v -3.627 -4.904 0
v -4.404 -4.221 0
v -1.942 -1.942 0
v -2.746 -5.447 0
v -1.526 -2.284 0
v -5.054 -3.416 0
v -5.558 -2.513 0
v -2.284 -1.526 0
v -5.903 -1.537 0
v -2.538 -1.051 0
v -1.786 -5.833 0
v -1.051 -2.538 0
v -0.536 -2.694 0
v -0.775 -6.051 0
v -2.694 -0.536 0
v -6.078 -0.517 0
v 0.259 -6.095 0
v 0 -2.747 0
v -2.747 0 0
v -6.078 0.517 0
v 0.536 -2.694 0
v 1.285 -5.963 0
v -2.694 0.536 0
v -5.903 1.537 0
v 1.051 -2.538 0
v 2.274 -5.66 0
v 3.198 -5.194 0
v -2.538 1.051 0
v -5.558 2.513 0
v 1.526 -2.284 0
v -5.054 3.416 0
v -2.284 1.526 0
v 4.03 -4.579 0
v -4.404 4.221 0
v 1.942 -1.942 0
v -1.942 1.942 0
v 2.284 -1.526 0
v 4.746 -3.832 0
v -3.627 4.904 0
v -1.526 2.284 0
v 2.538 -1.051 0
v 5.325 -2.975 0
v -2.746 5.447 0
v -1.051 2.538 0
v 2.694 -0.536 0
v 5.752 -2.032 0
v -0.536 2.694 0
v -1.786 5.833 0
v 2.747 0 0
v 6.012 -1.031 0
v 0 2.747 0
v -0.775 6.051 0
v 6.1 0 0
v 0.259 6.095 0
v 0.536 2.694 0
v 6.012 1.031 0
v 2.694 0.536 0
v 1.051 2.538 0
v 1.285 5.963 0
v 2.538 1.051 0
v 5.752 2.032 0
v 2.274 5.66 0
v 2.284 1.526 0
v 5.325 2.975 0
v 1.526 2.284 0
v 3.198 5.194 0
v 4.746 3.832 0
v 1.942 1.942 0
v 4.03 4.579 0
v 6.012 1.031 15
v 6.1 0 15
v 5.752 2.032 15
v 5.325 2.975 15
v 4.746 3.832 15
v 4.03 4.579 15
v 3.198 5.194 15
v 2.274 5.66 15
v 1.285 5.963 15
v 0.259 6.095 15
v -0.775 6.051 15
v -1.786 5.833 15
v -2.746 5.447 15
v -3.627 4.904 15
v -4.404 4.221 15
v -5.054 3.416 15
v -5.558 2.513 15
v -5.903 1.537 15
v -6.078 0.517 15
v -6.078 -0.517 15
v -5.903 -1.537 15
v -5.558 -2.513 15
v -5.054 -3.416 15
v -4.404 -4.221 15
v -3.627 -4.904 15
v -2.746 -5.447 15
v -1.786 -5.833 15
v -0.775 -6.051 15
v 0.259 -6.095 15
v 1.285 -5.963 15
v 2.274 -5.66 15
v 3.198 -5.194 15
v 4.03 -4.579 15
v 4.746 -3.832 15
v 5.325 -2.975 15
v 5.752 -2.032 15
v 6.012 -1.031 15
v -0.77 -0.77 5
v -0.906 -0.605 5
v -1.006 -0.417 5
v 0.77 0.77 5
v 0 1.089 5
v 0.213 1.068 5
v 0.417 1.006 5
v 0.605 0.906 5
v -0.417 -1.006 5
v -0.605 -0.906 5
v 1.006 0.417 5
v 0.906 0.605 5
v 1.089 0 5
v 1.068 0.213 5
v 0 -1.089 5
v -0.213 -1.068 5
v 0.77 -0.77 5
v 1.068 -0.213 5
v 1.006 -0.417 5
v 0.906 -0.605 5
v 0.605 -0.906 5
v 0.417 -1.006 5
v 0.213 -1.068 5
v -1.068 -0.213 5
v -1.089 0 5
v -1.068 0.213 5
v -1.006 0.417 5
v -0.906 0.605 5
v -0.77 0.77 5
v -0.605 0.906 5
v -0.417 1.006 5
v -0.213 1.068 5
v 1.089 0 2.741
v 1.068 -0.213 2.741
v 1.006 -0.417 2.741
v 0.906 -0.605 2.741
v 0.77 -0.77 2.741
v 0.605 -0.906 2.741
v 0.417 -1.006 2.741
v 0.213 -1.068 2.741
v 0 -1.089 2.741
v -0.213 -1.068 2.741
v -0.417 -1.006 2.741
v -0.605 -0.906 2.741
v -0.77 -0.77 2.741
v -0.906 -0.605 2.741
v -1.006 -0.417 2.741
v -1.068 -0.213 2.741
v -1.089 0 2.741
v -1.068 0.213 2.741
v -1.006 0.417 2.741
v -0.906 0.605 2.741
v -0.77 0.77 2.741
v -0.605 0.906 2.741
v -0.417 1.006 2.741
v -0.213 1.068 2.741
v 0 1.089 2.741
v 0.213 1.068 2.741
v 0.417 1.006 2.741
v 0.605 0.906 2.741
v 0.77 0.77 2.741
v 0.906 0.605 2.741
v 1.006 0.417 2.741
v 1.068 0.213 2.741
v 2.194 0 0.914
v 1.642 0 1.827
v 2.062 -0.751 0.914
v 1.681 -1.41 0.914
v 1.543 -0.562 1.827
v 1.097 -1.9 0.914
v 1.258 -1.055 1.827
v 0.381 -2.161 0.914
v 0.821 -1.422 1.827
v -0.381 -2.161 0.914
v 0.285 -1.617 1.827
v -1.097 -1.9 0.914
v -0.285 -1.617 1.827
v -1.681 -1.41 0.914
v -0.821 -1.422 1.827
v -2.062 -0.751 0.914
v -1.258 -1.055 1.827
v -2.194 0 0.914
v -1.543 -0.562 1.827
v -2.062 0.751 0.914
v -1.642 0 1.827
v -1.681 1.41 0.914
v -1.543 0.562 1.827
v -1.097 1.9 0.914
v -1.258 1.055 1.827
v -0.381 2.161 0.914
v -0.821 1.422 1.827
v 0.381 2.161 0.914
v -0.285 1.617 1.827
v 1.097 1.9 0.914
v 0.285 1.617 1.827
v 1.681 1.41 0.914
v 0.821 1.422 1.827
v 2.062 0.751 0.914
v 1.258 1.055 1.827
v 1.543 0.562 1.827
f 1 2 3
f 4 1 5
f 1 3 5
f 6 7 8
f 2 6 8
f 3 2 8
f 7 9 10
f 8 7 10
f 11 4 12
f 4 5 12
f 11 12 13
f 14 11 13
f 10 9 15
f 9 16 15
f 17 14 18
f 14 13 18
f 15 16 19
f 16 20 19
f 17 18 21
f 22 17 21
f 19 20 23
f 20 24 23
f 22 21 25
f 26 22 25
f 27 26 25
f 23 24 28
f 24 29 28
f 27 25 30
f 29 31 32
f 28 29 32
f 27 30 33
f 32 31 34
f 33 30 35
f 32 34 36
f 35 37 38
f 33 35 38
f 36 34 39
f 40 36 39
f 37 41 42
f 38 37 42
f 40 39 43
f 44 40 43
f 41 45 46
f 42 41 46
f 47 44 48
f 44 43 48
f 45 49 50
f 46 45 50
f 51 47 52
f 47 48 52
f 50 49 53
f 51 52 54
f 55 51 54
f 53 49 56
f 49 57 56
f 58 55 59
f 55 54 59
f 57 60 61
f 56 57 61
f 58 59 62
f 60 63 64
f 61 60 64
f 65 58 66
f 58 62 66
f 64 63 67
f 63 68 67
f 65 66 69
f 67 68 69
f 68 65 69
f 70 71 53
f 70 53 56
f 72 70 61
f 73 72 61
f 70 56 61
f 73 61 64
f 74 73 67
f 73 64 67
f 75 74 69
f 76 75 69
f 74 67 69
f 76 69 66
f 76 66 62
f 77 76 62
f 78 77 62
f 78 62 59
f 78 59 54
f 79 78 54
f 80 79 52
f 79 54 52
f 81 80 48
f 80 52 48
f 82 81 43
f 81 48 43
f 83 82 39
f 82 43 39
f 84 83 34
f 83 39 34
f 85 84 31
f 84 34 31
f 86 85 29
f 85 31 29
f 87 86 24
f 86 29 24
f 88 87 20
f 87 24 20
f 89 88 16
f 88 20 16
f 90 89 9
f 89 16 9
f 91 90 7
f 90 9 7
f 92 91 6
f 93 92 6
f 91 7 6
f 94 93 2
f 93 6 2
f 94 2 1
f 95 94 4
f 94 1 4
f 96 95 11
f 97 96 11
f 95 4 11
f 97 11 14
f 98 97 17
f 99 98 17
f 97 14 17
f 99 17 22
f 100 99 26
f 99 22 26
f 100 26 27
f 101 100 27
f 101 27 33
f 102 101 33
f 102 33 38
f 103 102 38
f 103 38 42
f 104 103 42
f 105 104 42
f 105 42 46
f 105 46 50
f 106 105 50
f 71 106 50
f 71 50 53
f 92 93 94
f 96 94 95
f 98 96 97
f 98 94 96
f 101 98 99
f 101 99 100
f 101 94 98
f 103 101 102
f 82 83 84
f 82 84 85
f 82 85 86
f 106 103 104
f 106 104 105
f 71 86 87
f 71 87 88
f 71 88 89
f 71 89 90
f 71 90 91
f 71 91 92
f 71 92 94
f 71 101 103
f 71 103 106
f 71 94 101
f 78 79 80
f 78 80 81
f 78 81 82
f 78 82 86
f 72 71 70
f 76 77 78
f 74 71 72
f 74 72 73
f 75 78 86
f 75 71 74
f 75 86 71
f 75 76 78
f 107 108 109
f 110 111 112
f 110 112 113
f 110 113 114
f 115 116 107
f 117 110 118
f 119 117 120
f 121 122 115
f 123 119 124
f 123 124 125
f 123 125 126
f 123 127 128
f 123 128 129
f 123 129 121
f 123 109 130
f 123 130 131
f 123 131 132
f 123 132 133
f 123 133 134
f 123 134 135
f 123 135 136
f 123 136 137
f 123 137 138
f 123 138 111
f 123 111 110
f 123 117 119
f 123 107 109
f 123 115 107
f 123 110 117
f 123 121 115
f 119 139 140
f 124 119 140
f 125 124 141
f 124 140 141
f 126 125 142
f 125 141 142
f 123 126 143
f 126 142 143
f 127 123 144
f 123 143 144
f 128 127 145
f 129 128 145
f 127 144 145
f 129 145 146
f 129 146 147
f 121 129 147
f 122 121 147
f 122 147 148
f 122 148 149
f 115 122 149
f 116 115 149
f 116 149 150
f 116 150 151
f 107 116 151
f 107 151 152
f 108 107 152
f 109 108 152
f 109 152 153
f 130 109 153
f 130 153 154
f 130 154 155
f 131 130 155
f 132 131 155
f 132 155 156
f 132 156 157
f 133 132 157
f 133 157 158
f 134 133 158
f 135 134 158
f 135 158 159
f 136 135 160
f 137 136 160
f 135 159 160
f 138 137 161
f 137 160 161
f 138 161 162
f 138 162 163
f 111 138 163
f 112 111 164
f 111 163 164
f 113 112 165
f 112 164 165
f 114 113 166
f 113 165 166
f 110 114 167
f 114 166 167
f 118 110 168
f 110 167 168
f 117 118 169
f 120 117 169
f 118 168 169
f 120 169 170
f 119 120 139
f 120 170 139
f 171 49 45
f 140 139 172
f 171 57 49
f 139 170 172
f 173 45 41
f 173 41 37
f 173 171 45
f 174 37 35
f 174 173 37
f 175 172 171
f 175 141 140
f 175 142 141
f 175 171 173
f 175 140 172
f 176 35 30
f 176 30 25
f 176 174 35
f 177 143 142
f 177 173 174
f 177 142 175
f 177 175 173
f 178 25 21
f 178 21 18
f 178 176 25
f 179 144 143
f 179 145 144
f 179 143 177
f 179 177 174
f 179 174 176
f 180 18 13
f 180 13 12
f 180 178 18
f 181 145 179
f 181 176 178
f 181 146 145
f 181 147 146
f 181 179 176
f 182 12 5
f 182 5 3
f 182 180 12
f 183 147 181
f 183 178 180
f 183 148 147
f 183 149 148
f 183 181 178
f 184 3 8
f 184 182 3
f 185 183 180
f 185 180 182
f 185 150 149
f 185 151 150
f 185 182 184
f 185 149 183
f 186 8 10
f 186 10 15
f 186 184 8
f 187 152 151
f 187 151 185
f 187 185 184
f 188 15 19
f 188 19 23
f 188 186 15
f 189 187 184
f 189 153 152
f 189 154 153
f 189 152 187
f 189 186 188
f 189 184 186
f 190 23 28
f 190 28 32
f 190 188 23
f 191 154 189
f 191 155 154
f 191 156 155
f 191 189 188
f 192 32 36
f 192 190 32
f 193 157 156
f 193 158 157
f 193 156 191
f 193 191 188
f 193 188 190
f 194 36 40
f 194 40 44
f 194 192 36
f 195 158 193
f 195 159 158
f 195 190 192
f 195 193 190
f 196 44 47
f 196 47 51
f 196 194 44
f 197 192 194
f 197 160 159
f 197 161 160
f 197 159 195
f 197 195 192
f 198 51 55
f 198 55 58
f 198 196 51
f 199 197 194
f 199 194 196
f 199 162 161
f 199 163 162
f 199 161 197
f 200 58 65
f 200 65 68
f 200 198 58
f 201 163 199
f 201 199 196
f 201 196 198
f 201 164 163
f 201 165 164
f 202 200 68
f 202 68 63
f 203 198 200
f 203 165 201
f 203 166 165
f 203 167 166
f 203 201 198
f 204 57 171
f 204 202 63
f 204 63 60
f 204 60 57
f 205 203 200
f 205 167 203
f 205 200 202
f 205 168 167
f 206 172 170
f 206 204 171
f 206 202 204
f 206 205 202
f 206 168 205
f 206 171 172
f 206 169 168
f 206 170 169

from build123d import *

# Parameters (mm, degrees)
F0_R     = 6.1
F1_DEPTH = 15
F4_R     = 1.089334
F5_DEPTH = 5


with BuildPart() as f1:
    # F0 (on Top) → F1 (new body)
    with BuildSketch(Plane.XY):
        Circle(F0_R)
    extrude(amount=F1_DEPTH)

    # F2 (on Front) → F3 (revolve, cut)
    with BuildSketch(Plane.XZ):
        Polygon((0, 4.542232), (0, 0), (1.185742, 0), align=None)
        Polygon((0, 4.542232), (1.185742, 0), (2.746811, 0), align=None)
    revolve(axis=Axis((0, 0, 2.271116), (0, 0, -1)), mode=Mode.SUBTRACT)

    # F4 (on face) → F5 (cut)
    with BuildSketch(Plane(origin=(0, 0, 0), x_dir=(1, 0, 0), z_dir=(0, 0, -1))):
        Circle(F4_R)
    extrude(amount=-F5_DEPTH, mode=Mode.SUBTRACT)


solid = f1.part
